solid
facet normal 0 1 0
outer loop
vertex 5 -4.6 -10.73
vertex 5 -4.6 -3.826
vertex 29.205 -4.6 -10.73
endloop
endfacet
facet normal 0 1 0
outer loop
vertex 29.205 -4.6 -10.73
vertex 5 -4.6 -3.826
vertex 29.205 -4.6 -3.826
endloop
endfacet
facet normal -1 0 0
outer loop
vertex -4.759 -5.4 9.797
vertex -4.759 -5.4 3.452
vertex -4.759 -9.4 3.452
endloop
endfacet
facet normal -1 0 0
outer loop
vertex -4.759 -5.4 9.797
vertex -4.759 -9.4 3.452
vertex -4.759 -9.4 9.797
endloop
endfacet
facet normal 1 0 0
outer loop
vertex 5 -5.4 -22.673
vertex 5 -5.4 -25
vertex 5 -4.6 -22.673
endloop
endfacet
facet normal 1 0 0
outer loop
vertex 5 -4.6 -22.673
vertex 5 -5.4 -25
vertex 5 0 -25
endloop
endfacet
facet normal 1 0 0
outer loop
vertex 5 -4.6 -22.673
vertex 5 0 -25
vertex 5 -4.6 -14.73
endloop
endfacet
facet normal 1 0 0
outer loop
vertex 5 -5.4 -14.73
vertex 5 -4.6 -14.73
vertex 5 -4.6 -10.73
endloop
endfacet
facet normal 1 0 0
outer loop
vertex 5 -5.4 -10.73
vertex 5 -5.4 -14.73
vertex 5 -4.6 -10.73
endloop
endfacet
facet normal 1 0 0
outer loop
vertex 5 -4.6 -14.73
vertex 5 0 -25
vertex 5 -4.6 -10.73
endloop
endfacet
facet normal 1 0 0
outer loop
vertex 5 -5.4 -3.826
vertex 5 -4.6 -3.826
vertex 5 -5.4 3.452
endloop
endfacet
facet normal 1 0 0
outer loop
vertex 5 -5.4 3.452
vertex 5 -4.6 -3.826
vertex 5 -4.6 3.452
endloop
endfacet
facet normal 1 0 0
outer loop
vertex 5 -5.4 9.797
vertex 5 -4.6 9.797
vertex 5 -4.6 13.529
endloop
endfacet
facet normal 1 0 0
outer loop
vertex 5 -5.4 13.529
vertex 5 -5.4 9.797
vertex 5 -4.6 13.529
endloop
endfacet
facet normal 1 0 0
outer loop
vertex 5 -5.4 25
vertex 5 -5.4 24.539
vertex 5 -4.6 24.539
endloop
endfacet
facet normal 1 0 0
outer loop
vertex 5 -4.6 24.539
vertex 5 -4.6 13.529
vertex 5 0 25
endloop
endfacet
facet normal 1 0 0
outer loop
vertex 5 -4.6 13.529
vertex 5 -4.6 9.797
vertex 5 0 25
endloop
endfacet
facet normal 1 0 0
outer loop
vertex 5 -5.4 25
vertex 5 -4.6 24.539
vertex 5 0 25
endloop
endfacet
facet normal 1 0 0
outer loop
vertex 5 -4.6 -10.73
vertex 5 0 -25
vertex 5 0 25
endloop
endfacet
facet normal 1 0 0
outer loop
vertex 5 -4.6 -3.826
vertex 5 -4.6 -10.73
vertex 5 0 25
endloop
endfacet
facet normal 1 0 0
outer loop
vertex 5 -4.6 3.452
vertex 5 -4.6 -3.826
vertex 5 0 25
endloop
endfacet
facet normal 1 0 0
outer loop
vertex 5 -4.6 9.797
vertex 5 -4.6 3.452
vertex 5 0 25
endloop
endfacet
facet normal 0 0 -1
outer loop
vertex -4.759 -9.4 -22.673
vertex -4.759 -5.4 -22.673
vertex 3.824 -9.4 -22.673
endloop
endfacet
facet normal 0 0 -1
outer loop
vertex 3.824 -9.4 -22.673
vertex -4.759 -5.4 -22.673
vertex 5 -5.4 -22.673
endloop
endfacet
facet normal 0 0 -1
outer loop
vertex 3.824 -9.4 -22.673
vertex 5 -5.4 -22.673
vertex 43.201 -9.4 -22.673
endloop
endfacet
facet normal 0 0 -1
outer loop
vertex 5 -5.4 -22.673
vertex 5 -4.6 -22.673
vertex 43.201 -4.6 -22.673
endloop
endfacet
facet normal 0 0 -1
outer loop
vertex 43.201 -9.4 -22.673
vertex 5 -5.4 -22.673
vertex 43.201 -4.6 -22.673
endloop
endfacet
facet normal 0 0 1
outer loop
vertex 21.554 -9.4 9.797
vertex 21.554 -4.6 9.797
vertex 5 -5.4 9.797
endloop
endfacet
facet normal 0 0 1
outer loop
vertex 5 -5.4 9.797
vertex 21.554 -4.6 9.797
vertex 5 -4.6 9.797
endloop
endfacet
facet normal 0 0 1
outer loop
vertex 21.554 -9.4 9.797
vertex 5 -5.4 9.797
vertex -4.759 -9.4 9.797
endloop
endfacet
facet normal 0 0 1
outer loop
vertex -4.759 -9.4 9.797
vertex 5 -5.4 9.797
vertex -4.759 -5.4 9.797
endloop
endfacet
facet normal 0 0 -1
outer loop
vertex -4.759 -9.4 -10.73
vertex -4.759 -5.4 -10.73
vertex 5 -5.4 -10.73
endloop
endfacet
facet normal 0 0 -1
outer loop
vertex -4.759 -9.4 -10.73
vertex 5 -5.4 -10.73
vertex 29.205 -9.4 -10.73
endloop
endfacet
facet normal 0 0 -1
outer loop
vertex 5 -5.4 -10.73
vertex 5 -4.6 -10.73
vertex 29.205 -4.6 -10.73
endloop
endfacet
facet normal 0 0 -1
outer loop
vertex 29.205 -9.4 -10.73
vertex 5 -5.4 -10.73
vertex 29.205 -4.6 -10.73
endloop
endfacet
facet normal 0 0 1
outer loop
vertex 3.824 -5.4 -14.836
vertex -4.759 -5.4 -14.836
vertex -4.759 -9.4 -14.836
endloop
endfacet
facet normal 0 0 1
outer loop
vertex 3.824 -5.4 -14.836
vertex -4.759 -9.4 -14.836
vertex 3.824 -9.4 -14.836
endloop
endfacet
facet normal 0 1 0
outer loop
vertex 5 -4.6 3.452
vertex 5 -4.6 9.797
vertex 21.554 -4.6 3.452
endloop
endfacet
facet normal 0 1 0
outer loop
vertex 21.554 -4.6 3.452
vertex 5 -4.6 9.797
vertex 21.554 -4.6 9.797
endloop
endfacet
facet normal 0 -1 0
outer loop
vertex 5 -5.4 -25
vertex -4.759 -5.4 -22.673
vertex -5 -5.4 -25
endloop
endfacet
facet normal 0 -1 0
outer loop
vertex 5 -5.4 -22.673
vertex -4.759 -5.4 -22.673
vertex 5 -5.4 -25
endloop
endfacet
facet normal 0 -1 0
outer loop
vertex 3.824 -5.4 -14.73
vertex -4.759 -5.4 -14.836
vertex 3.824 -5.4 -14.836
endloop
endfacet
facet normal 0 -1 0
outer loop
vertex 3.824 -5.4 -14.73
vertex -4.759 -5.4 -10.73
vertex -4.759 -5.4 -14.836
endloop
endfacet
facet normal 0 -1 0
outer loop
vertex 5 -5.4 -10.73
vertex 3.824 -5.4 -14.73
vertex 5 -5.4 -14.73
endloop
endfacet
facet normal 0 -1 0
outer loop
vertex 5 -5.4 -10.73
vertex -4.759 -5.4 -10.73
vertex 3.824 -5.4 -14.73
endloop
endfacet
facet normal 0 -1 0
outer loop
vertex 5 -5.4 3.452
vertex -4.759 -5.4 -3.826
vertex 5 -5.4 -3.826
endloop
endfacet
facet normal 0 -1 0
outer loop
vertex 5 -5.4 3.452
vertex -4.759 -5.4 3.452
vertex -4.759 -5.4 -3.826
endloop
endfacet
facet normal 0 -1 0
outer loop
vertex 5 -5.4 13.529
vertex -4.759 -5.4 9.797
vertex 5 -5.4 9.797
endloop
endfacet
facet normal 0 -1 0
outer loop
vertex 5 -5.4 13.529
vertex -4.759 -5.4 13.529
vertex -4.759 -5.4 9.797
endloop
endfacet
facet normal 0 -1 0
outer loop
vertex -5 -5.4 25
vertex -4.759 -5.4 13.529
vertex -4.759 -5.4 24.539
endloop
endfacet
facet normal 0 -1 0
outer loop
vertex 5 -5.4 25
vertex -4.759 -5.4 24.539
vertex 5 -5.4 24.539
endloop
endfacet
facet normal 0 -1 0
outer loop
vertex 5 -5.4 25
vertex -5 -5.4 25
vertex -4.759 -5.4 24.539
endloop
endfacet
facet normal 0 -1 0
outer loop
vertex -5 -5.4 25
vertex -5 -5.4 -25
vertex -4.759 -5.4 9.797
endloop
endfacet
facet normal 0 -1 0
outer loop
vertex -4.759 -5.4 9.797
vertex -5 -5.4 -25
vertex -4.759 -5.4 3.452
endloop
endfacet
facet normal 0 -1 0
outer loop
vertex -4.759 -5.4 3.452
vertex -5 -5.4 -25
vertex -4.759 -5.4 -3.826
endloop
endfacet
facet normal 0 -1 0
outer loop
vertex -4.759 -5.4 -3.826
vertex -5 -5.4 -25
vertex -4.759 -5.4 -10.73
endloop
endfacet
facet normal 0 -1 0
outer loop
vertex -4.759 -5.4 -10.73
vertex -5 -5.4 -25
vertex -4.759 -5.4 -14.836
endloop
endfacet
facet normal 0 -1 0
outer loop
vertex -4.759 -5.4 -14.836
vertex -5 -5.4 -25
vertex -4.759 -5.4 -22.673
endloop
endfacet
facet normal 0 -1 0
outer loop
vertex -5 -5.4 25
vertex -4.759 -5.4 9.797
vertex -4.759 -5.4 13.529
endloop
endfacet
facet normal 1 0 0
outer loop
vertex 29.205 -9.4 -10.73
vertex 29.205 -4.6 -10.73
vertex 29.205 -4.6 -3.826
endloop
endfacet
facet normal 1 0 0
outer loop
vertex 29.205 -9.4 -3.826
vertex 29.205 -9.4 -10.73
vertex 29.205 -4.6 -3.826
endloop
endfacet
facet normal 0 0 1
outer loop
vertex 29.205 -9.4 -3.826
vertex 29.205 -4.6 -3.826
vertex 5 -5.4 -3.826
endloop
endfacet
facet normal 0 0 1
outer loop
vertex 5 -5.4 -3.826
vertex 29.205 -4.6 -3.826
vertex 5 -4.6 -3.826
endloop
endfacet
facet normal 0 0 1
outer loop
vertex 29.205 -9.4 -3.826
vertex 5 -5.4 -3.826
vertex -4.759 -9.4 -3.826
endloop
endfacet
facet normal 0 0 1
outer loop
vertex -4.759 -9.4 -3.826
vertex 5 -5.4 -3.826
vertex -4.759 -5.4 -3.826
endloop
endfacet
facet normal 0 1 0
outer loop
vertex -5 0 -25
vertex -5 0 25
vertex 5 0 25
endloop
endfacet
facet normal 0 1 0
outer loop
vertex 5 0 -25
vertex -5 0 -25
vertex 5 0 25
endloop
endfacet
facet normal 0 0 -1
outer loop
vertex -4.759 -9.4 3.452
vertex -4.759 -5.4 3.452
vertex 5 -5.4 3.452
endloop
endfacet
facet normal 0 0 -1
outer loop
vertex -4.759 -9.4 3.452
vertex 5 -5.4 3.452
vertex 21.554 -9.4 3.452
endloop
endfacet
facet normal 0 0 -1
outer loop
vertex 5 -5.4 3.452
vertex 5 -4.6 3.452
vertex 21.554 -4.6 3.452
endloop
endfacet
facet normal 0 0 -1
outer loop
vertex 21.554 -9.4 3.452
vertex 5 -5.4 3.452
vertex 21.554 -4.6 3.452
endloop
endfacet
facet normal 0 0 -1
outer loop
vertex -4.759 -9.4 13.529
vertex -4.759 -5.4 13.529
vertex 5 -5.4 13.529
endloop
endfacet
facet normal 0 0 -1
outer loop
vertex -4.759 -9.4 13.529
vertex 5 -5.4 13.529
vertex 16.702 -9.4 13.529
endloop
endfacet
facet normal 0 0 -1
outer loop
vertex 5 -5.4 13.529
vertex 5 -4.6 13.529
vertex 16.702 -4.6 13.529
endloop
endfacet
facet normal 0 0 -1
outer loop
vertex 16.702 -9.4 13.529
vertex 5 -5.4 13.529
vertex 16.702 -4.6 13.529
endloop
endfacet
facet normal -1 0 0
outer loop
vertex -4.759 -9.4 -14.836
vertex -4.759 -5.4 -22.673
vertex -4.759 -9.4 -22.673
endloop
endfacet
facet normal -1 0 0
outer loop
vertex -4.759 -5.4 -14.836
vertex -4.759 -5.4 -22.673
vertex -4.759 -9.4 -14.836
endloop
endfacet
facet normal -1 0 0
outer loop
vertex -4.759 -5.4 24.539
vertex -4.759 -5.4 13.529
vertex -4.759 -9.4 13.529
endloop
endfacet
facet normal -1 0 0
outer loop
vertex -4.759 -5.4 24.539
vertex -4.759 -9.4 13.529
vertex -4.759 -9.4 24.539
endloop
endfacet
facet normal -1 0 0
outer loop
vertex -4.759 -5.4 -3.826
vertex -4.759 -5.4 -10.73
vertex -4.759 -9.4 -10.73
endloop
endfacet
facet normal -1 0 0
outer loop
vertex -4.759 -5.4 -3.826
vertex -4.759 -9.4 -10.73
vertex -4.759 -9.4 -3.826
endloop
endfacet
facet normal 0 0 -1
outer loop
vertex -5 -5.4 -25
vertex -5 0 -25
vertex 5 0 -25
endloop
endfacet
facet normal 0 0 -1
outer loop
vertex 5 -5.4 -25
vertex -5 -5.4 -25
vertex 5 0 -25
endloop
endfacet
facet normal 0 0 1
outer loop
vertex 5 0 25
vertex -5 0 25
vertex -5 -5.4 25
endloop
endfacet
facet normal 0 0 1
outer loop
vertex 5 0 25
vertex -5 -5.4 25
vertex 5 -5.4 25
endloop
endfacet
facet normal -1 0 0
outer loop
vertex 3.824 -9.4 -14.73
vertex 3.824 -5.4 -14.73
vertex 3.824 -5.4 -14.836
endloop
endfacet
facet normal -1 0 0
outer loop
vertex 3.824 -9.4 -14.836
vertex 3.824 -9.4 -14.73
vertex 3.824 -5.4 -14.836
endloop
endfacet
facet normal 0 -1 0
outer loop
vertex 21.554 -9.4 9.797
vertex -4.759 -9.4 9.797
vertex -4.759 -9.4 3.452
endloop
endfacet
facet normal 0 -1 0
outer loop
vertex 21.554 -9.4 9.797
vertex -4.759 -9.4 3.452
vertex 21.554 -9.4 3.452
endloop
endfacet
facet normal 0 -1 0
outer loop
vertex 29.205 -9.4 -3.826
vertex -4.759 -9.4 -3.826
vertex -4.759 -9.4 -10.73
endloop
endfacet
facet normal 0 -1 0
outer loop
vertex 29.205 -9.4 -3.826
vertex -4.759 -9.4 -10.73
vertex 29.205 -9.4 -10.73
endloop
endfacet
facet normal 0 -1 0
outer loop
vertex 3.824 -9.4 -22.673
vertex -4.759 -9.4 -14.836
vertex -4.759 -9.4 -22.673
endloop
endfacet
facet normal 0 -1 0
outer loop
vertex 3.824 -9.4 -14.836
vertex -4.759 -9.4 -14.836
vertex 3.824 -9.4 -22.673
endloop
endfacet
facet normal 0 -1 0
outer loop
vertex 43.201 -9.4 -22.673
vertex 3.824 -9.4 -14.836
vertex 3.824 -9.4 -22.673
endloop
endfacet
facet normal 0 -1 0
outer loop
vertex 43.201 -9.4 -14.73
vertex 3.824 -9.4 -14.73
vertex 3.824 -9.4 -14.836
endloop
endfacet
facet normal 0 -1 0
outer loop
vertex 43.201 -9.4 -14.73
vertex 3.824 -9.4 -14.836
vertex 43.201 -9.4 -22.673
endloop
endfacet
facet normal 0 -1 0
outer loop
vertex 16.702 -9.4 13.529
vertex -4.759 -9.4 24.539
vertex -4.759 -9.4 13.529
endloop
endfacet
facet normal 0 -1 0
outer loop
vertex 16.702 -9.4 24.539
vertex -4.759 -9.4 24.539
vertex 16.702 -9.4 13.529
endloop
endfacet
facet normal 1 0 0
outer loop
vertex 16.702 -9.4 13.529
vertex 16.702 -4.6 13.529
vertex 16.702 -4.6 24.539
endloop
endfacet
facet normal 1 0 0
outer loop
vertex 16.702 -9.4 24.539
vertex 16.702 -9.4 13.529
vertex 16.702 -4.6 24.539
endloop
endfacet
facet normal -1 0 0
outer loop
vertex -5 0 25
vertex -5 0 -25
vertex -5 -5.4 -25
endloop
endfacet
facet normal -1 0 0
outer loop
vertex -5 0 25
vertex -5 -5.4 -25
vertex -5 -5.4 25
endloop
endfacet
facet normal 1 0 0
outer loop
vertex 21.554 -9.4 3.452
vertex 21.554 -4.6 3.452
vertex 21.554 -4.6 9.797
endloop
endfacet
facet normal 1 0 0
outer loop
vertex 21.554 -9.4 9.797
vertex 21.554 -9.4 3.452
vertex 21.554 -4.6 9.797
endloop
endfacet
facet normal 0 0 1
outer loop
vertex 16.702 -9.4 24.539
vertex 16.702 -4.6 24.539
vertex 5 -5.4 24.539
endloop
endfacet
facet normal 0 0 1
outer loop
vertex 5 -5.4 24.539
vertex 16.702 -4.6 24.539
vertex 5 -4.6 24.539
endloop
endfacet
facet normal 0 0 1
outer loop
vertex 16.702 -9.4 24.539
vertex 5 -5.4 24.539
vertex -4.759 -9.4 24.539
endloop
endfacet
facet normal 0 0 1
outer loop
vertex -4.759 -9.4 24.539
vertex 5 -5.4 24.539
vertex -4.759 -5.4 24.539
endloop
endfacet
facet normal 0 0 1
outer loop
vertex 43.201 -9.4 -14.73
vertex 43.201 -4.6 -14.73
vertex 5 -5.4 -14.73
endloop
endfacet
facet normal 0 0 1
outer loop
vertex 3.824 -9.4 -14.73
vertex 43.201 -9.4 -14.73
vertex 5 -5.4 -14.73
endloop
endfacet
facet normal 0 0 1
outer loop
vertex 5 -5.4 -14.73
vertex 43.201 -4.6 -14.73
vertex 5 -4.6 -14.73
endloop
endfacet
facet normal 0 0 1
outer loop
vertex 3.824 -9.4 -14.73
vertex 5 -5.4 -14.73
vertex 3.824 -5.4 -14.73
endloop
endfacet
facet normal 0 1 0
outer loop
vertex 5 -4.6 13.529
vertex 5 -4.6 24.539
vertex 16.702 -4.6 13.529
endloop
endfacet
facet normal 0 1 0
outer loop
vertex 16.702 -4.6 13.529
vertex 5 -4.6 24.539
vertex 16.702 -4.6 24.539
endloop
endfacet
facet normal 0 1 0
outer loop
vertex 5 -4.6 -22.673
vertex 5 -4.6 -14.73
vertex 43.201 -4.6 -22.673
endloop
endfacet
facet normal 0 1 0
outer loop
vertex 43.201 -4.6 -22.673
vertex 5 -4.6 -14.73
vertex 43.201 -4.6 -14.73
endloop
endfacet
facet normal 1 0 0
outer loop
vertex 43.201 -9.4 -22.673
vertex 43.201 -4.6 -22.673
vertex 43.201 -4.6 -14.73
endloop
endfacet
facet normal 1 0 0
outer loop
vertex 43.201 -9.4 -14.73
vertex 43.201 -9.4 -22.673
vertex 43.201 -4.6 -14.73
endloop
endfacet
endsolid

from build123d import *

# Parameters (mm, degrees)
F0_W     = 10
F0_H     = 50
F1_DEPTH = 5.4
F3_START = 4.6
F2_W     = 8.5828267038
F2_H     = 11.0100731254
F2_W_2   = 12.8774824552
F2_H_2   = 6.9046204444
F2_W_3   = 25.3804451786
F2_H_3   = 7.8376773745
F2_H_4   = 6.3447866123
F2_W_4   = 17.729378771
F3_DEPTH = 4.8


with BuildPart() as f1:
    # F0 (on Front) → F1 (new body)
    with BuildSketch(Plane.XZ):
        Rectangle(F0_W, F0_H)
    extrude(amount=F1_DEPTH)

    # F2 (on Front) → F3 (join)
    with BuildSketch(Plane.XZ.offset(F3_START)):
        with Locations((-0.4671770148, 19.0343614668)):
            Rectangle(F2_W, F2_H)
        with Locations((10.2629775647, 19.0343614668)):
            Rectangle(F2_W_2, F2_H)
        with Locations((-0.4671770148, -7.2778436588)):
            Rectangle(F2_W, F2_H_2)
        with Locations((16.5144589264, -7.2778436588)):
            Rectangle(F2_W_3, F2_H_2)
        with Locations((-0.4671770148, -18.7544440851)):
            Rectangle(F2_W, F2_H_3)
        Polygon((3.8242363371, -14.7295454517), (3.8242363371, -14.8356053978), (3.8242363371, -22.6732827723), (43.2005375624, -22.6732827723), (43.2005375624, -14.7295454517), align=None)
        with Locations((-0.4671770148, 6.6247038776)):
            Rectangle(F2_W, F2_H_4)
        with Locations((12.6889257226, 6.6247038776)):
            Rectangle(F2_W_4, F2_H_4)
    extrude(amount=F3_DEPTH)


solid = f1.part
